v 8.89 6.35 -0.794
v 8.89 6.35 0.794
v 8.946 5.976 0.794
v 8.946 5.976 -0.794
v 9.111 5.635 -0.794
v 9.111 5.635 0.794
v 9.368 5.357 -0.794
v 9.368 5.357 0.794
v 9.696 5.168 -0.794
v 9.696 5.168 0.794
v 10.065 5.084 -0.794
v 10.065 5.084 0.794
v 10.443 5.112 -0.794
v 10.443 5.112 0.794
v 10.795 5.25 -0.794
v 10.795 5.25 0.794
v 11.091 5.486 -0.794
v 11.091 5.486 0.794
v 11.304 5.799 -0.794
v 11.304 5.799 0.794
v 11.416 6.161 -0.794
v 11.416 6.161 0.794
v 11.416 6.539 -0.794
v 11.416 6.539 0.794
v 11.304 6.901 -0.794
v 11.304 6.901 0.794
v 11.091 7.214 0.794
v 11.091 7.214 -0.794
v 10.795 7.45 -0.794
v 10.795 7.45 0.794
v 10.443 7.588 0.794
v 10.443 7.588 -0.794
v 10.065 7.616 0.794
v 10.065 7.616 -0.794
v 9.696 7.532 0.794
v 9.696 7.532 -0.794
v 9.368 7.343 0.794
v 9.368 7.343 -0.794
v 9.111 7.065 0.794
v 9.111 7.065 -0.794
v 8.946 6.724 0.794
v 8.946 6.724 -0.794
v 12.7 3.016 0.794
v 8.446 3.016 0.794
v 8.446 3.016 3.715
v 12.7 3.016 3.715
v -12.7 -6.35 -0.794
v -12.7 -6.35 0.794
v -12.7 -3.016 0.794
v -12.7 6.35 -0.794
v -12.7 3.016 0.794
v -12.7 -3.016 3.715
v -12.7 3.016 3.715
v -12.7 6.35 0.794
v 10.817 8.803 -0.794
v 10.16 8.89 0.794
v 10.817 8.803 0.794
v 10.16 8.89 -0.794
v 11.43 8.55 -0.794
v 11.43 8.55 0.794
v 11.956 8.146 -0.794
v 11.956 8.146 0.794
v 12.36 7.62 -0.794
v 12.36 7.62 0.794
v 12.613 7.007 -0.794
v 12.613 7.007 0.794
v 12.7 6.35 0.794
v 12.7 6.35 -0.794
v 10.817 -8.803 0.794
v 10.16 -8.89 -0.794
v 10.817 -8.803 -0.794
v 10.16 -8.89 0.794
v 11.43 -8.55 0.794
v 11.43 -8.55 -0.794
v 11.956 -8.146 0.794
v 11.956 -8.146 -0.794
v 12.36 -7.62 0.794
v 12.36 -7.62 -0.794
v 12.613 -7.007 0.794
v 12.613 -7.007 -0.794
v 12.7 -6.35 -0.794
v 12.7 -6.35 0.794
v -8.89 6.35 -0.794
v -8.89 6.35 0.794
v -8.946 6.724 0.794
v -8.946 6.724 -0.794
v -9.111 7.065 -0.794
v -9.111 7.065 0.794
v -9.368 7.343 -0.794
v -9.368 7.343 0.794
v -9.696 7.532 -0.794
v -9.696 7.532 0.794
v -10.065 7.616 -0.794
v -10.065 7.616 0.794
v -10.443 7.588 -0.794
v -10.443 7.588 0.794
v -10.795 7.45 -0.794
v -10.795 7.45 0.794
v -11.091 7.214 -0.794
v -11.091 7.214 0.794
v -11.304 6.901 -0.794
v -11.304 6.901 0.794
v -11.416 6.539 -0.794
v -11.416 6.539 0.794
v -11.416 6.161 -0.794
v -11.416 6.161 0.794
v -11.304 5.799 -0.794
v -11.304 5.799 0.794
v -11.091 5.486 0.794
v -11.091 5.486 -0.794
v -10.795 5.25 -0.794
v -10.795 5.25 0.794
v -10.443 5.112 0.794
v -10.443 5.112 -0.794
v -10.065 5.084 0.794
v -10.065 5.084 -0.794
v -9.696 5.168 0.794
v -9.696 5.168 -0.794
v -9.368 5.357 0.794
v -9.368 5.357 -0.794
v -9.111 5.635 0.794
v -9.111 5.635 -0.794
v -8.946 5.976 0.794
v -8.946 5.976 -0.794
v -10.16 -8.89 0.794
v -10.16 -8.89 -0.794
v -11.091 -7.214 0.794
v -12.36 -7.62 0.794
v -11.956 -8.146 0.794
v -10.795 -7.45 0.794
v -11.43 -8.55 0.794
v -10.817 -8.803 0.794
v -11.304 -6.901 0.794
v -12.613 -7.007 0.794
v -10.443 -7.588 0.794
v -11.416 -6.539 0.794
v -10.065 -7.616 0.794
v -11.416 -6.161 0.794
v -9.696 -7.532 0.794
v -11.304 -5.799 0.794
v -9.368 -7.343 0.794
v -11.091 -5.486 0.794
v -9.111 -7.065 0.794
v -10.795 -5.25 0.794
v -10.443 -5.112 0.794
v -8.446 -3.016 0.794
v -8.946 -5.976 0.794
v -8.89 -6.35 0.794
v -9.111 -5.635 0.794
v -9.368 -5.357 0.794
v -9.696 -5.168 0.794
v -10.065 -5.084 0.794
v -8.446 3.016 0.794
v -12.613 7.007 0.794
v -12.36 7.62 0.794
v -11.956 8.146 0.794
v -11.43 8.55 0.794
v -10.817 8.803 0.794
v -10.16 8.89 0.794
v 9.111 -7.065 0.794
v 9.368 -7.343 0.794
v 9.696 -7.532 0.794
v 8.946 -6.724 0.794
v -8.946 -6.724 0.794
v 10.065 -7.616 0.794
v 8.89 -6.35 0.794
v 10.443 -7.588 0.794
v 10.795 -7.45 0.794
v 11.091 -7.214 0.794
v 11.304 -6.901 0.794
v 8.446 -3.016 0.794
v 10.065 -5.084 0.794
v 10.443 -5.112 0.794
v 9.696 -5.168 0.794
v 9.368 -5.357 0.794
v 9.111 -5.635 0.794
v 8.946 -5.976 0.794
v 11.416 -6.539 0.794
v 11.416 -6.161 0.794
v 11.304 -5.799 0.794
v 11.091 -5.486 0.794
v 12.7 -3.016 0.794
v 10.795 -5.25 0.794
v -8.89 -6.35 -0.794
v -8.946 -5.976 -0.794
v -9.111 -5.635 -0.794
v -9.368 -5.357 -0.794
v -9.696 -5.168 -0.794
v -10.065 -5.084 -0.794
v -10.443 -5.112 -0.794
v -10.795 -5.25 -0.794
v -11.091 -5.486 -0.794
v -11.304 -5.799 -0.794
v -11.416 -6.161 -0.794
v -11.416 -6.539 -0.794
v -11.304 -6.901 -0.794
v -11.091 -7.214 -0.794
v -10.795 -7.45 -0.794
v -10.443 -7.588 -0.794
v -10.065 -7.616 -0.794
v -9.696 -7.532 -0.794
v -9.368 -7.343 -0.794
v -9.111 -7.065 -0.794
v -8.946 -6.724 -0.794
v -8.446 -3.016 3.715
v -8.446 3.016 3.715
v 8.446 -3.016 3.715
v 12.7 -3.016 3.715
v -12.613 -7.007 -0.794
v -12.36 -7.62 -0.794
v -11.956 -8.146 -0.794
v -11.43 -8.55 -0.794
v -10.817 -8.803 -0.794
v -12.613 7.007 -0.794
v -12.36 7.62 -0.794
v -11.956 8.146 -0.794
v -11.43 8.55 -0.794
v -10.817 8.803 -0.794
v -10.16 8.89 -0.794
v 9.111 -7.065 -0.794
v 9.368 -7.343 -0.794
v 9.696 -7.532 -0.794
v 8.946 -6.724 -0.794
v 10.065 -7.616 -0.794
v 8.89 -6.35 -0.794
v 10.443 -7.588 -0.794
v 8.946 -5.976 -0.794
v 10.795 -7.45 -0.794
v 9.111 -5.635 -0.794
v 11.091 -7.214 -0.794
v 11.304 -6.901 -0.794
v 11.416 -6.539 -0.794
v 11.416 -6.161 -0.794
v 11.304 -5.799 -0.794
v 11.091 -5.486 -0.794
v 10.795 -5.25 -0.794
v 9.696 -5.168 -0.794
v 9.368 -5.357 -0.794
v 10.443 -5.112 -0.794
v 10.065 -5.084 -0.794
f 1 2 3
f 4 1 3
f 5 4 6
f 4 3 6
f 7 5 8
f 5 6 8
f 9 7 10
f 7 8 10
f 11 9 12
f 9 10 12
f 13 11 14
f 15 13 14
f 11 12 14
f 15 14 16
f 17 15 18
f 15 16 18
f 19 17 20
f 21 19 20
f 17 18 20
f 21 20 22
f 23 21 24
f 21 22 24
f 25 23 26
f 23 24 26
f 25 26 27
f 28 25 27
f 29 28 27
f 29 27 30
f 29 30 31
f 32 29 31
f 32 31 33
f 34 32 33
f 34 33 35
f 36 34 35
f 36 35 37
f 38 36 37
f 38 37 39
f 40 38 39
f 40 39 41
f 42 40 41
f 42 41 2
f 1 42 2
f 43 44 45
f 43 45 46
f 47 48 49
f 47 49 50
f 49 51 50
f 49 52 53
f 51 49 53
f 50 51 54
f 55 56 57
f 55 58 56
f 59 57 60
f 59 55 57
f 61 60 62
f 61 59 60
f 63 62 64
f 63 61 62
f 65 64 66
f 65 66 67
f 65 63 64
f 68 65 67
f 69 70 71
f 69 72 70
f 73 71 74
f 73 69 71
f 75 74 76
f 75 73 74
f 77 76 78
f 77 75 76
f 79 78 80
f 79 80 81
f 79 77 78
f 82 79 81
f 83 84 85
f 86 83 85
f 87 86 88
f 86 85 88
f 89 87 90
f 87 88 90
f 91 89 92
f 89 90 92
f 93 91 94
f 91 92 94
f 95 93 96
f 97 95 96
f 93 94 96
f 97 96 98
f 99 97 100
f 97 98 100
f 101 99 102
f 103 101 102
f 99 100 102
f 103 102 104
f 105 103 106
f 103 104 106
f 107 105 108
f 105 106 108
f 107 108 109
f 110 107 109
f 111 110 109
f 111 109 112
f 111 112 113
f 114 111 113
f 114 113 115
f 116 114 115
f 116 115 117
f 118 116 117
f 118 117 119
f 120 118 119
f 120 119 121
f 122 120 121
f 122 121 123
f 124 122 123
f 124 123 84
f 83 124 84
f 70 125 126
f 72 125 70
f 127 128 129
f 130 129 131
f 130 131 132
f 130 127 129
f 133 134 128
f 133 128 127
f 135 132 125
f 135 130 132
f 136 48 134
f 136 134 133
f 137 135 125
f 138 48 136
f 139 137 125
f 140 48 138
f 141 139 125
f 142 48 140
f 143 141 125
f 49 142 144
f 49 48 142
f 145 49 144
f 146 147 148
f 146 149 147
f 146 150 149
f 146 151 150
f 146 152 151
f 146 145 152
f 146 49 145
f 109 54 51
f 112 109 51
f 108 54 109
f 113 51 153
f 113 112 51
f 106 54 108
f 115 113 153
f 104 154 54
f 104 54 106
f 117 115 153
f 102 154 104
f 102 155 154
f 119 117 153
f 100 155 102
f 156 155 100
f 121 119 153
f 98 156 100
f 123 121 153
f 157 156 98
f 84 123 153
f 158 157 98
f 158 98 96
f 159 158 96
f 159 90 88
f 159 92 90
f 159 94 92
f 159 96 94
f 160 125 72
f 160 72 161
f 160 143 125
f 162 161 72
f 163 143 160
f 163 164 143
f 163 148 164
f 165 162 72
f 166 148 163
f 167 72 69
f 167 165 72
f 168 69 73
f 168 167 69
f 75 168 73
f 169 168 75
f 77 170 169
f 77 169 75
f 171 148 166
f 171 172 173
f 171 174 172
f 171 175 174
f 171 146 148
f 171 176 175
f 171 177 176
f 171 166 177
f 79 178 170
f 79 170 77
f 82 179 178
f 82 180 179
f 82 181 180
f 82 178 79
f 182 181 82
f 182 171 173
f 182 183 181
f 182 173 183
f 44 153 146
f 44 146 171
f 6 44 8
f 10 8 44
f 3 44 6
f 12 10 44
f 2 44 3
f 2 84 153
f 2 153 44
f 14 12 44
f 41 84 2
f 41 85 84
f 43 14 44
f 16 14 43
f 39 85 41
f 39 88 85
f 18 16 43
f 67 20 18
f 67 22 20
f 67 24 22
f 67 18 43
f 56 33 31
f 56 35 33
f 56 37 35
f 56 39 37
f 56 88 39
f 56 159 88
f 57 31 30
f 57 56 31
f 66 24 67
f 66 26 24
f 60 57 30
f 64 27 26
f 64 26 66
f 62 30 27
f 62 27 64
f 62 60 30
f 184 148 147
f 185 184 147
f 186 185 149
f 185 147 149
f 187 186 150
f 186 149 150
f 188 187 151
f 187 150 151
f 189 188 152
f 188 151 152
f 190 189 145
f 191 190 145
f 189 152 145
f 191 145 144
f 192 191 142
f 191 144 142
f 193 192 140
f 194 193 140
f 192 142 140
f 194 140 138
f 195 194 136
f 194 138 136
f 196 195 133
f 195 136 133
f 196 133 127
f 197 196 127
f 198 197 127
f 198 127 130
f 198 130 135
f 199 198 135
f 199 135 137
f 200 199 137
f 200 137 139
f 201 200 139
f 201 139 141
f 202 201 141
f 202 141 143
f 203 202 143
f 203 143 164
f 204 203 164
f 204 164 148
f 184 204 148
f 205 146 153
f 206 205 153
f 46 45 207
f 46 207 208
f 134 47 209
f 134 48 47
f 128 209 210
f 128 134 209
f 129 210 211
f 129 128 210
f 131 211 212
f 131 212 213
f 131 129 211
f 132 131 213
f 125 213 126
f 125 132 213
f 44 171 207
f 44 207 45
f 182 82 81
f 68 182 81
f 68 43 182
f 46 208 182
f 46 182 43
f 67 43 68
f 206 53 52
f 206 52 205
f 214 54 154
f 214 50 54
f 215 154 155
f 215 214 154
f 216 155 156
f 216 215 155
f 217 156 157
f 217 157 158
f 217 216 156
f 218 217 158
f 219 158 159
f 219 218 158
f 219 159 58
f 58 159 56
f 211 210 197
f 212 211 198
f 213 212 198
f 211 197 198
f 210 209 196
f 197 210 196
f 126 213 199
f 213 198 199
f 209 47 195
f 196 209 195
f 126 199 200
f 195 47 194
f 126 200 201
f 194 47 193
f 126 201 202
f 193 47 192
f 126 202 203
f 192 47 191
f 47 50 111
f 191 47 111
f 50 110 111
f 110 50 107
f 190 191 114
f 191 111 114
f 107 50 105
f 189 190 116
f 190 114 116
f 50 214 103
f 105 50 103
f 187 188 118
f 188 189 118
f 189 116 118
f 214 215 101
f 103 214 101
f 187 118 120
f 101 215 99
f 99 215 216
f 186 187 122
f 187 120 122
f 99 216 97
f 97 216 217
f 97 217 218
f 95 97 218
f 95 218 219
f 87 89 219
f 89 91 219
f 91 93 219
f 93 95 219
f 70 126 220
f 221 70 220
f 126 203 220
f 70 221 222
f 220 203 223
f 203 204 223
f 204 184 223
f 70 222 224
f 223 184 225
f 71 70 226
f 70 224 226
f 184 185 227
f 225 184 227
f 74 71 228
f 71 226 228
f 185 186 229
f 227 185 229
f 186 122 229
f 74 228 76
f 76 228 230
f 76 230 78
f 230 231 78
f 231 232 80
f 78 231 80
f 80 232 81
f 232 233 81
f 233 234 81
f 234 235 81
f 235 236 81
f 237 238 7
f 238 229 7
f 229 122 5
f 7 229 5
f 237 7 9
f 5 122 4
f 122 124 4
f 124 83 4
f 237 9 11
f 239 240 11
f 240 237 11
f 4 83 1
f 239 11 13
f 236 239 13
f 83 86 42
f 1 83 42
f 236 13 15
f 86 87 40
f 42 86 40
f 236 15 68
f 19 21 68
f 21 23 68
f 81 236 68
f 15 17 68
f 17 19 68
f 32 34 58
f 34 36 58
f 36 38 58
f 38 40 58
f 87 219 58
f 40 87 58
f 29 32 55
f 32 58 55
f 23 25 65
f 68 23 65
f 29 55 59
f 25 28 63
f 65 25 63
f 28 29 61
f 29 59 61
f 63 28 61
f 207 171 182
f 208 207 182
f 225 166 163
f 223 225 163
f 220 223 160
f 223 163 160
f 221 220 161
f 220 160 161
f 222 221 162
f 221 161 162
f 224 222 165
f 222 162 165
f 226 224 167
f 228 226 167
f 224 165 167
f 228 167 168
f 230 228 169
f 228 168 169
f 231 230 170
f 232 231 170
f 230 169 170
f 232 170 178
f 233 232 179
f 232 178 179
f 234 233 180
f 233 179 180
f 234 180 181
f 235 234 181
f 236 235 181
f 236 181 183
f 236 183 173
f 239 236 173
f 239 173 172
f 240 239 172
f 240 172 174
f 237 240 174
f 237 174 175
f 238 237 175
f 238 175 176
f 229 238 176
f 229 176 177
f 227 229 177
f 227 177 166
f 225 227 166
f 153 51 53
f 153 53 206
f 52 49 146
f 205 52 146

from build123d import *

# Parameters (mm, degrees)
SKETCH1_W           = 25.4
SKETCH1_H           = 17.78
BOSS_EXTRUDE1_DEPTH = 0.79375
SKETCH2_W           = 4.2545
SKETCH2_H           = 6.0325
BOSS_EXTRUDE2_DEPTH = 2.921
SKETCH3_R           = 1.27
CUT_EXTRUDE1_DEPTH  = 16.775117781
FILLET1_R           = 2.54


with BuildPart() as part:
    # Sketch1 → Boss-Extrude1 (new, symmetric)
    with BuildSketch(Plane.XY):
        Rectangle(SKETCH1_W, SKETCH1_H)
    extrude(amount=BOSS_EXTRUDE1_DEPTH, both=True)

    # Sketch2 → Boss-Extrude2 (add)
    with BuildSketch(Plane.XY.offset(0.79375)):
        with Locations((10.57275, 0)):
            Rectangle(SKETCH2_W, SKETCH2_H)
        with Locations((-10.57275, 0)):
            Rectangle(SKETCH2_W, SKETCH2_H)
    extrude(amount=BOSS_EXTRUDE2_DEPTH)

    # Sketch3 → Cut-Extrude1 (cut, through all)
    with BuildSketch(Plane.XY.offset(0.79375)):
        with Locations((-10.16, 6.35)):
            Circle(SKETCH3_R)
        with Locations((-10.16, -6.35)):
            Circle(SKETCH3_R)
        with Locations(Location((10.16, -6.35, 0), (0, 0, 180))):
            Circle(SKETCH3_R)
        with Locations(Location((10.16, 6.35, 0), (0, 0, 180))):
            Circle(SKETCH3_R)
    extrude(amount=-CUT_EXTRUDE1_DEPTH, mode=Mode.SUBTRACT)

    # Fillet1
    fillet1_edges = [part.edges().sort_by_distance(p)[0] for p in [
        (12.7, -8.89, 0),
        (-12.7, -8.89, 0),
        (-12.7, 8.89, 0),
        (12.7, 8.89, 0),
    ]]
    fillet(fillet1_edges, radius=FILLET1_R)


solid = part.part
